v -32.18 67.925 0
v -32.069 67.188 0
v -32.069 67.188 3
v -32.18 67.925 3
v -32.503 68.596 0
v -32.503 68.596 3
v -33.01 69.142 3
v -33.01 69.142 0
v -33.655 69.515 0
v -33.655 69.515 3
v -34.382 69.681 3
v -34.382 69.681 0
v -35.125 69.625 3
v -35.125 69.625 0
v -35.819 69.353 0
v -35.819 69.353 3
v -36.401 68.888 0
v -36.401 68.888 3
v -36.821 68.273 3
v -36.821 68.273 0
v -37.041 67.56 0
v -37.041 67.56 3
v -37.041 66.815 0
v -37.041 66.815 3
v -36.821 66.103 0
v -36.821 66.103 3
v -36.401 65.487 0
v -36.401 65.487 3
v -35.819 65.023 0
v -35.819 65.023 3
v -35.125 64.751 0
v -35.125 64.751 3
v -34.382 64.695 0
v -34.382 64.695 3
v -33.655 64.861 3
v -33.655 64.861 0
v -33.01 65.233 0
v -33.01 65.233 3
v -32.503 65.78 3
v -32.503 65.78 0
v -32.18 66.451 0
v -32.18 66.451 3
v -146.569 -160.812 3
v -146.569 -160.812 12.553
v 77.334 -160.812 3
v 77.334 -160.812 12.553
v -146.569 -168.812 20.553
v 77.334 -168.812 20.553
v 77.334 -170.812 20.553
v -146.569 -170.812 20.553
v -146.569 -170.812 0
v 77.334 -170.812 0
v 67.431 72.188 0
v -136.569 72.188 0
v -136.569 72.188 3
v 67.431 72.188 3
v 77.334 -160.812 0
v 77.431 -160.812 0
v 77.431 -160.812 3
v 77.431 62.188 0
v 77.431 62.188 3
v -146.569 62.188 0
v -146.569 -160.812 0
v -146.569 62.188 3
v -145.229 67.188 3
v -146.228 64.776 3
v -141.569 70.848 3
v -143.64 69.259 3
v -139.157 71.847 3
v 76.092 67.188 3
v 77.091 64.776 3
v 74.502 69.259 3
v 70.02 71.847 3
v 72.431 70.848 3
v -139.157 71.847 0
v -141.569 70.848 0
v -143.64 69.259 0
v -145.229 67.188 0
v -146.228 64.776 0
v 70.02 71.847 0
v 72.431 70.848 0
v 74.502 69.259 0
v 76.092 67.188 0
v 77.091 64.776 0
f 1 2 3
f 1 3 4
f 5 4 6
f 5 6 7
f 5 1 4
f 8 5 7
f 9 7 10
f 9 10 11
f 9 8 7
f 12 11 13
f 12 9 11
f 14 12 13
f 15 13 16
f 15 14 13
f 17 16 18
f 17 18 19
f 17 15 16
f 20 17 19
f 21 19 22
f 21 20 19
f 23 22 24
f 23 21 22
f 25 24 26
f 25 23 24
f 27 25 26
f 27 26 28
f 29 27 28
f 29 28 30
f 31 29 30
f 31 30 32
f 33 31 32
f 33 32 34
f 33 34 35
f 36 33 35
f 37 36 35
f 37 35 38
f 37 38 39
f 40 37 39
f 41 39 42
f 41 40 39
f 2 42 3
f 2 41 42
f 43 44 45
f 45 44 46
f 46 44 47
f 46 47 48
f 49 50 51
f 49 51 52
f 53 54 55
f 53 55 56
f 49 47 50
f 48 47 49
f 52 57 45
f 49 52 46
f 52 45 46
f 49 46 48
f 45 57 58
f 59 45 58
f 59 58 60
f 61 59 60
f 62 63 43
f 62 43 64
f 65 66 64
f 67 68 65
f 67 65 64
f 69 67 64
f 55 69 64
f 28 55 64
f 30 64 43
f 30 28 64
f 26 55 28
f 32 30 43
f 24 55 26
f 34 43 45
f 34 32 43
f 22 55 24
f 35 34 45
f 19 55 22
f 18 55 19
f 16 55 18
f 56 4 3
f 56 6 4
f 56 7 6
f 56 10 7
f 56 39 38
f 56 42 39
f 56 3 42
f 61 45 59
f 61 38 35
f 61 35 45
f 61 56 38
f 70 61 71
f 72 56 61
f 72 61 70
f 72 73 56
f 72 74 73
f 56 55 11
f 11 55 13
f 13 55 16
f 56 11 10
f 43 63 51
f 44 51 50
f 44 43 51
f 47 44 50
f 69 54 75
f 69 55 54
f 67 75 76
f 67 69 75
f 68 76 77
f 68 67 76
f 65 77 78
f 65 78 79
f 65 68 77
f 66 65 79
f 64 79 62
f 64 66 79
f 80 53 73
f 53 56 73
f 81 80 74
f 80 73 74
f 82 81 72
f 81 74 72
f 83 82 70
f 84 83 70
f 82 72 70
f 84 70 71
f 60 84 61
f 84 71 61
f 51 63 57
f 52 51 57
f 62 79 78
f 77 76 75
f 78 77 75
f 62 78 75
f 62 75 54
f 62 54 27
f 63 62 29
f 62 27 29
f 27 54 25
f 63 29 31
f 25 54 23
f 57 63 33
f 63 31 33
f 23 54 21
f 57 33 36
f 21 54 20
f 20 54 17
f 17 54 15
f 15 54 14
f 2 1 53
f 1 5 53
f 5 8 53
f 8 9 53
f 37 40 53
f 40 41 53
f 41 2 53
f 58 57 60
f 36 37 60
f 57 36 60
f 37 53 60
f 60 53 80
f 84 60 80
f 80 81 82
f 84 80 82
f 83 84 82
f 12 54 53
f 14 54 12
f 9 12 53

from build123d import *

# Parameters (mm, degrees)
F0_W     = 224
F0_H     = 233
F0_R     = 2.5
F1_DEPTH = 3
F2_W     = 223.902777
F2_H     = 20.5527
F3_DEPTH = 10
F4_SIZE  = 8
F5_R     = 10
F6_R     = 10


with BuildPart() as f1:
    # F0 (on Top) → F1 (new body)
    with BuildSketch(Plane.XY):
        with Locations((-34.568664, -44.312108)):
            Rectangle(F0_W, F0_H)
        with Locations((-34.568664, 67.187892)):
            Circle(F0_R, mode=Mode.SUBTRACT)
    extrude(amount=F1_DEPTH)

    # F2 (on face) → F3 (join)
    with BuildSketch(Plane.XZ.offset(160.812108)):
        with Locations((-34.617275, 10.27635)):
            Rectangle(F2_W, F2_H)
    extrude(amount=F3_DEPTH)

    # F4
    f4_edges = [f1.edges().sort_by_distance(p)[0] for p in [
        (-34.617275, -160.812108, 20.5527),
    ]]
    chamfer(f4_edges, length=F4_SIZE)

    # F5
    f5_edges = [f1.edges().sort_by_distance(p)[0] for p in [
        (-146.568664, 72.187892, 1.5),
    ]]
    fillet(f5_edges, radius=F5_R)

    # F6
    f6_edges = [f1.edges().sort_by_distance(p)[0] for p in [
        (77.431336, 72.187892, 1.5),
    ]]
    fillet(f6_edges, radius=F6_R)


solid = f1.part
